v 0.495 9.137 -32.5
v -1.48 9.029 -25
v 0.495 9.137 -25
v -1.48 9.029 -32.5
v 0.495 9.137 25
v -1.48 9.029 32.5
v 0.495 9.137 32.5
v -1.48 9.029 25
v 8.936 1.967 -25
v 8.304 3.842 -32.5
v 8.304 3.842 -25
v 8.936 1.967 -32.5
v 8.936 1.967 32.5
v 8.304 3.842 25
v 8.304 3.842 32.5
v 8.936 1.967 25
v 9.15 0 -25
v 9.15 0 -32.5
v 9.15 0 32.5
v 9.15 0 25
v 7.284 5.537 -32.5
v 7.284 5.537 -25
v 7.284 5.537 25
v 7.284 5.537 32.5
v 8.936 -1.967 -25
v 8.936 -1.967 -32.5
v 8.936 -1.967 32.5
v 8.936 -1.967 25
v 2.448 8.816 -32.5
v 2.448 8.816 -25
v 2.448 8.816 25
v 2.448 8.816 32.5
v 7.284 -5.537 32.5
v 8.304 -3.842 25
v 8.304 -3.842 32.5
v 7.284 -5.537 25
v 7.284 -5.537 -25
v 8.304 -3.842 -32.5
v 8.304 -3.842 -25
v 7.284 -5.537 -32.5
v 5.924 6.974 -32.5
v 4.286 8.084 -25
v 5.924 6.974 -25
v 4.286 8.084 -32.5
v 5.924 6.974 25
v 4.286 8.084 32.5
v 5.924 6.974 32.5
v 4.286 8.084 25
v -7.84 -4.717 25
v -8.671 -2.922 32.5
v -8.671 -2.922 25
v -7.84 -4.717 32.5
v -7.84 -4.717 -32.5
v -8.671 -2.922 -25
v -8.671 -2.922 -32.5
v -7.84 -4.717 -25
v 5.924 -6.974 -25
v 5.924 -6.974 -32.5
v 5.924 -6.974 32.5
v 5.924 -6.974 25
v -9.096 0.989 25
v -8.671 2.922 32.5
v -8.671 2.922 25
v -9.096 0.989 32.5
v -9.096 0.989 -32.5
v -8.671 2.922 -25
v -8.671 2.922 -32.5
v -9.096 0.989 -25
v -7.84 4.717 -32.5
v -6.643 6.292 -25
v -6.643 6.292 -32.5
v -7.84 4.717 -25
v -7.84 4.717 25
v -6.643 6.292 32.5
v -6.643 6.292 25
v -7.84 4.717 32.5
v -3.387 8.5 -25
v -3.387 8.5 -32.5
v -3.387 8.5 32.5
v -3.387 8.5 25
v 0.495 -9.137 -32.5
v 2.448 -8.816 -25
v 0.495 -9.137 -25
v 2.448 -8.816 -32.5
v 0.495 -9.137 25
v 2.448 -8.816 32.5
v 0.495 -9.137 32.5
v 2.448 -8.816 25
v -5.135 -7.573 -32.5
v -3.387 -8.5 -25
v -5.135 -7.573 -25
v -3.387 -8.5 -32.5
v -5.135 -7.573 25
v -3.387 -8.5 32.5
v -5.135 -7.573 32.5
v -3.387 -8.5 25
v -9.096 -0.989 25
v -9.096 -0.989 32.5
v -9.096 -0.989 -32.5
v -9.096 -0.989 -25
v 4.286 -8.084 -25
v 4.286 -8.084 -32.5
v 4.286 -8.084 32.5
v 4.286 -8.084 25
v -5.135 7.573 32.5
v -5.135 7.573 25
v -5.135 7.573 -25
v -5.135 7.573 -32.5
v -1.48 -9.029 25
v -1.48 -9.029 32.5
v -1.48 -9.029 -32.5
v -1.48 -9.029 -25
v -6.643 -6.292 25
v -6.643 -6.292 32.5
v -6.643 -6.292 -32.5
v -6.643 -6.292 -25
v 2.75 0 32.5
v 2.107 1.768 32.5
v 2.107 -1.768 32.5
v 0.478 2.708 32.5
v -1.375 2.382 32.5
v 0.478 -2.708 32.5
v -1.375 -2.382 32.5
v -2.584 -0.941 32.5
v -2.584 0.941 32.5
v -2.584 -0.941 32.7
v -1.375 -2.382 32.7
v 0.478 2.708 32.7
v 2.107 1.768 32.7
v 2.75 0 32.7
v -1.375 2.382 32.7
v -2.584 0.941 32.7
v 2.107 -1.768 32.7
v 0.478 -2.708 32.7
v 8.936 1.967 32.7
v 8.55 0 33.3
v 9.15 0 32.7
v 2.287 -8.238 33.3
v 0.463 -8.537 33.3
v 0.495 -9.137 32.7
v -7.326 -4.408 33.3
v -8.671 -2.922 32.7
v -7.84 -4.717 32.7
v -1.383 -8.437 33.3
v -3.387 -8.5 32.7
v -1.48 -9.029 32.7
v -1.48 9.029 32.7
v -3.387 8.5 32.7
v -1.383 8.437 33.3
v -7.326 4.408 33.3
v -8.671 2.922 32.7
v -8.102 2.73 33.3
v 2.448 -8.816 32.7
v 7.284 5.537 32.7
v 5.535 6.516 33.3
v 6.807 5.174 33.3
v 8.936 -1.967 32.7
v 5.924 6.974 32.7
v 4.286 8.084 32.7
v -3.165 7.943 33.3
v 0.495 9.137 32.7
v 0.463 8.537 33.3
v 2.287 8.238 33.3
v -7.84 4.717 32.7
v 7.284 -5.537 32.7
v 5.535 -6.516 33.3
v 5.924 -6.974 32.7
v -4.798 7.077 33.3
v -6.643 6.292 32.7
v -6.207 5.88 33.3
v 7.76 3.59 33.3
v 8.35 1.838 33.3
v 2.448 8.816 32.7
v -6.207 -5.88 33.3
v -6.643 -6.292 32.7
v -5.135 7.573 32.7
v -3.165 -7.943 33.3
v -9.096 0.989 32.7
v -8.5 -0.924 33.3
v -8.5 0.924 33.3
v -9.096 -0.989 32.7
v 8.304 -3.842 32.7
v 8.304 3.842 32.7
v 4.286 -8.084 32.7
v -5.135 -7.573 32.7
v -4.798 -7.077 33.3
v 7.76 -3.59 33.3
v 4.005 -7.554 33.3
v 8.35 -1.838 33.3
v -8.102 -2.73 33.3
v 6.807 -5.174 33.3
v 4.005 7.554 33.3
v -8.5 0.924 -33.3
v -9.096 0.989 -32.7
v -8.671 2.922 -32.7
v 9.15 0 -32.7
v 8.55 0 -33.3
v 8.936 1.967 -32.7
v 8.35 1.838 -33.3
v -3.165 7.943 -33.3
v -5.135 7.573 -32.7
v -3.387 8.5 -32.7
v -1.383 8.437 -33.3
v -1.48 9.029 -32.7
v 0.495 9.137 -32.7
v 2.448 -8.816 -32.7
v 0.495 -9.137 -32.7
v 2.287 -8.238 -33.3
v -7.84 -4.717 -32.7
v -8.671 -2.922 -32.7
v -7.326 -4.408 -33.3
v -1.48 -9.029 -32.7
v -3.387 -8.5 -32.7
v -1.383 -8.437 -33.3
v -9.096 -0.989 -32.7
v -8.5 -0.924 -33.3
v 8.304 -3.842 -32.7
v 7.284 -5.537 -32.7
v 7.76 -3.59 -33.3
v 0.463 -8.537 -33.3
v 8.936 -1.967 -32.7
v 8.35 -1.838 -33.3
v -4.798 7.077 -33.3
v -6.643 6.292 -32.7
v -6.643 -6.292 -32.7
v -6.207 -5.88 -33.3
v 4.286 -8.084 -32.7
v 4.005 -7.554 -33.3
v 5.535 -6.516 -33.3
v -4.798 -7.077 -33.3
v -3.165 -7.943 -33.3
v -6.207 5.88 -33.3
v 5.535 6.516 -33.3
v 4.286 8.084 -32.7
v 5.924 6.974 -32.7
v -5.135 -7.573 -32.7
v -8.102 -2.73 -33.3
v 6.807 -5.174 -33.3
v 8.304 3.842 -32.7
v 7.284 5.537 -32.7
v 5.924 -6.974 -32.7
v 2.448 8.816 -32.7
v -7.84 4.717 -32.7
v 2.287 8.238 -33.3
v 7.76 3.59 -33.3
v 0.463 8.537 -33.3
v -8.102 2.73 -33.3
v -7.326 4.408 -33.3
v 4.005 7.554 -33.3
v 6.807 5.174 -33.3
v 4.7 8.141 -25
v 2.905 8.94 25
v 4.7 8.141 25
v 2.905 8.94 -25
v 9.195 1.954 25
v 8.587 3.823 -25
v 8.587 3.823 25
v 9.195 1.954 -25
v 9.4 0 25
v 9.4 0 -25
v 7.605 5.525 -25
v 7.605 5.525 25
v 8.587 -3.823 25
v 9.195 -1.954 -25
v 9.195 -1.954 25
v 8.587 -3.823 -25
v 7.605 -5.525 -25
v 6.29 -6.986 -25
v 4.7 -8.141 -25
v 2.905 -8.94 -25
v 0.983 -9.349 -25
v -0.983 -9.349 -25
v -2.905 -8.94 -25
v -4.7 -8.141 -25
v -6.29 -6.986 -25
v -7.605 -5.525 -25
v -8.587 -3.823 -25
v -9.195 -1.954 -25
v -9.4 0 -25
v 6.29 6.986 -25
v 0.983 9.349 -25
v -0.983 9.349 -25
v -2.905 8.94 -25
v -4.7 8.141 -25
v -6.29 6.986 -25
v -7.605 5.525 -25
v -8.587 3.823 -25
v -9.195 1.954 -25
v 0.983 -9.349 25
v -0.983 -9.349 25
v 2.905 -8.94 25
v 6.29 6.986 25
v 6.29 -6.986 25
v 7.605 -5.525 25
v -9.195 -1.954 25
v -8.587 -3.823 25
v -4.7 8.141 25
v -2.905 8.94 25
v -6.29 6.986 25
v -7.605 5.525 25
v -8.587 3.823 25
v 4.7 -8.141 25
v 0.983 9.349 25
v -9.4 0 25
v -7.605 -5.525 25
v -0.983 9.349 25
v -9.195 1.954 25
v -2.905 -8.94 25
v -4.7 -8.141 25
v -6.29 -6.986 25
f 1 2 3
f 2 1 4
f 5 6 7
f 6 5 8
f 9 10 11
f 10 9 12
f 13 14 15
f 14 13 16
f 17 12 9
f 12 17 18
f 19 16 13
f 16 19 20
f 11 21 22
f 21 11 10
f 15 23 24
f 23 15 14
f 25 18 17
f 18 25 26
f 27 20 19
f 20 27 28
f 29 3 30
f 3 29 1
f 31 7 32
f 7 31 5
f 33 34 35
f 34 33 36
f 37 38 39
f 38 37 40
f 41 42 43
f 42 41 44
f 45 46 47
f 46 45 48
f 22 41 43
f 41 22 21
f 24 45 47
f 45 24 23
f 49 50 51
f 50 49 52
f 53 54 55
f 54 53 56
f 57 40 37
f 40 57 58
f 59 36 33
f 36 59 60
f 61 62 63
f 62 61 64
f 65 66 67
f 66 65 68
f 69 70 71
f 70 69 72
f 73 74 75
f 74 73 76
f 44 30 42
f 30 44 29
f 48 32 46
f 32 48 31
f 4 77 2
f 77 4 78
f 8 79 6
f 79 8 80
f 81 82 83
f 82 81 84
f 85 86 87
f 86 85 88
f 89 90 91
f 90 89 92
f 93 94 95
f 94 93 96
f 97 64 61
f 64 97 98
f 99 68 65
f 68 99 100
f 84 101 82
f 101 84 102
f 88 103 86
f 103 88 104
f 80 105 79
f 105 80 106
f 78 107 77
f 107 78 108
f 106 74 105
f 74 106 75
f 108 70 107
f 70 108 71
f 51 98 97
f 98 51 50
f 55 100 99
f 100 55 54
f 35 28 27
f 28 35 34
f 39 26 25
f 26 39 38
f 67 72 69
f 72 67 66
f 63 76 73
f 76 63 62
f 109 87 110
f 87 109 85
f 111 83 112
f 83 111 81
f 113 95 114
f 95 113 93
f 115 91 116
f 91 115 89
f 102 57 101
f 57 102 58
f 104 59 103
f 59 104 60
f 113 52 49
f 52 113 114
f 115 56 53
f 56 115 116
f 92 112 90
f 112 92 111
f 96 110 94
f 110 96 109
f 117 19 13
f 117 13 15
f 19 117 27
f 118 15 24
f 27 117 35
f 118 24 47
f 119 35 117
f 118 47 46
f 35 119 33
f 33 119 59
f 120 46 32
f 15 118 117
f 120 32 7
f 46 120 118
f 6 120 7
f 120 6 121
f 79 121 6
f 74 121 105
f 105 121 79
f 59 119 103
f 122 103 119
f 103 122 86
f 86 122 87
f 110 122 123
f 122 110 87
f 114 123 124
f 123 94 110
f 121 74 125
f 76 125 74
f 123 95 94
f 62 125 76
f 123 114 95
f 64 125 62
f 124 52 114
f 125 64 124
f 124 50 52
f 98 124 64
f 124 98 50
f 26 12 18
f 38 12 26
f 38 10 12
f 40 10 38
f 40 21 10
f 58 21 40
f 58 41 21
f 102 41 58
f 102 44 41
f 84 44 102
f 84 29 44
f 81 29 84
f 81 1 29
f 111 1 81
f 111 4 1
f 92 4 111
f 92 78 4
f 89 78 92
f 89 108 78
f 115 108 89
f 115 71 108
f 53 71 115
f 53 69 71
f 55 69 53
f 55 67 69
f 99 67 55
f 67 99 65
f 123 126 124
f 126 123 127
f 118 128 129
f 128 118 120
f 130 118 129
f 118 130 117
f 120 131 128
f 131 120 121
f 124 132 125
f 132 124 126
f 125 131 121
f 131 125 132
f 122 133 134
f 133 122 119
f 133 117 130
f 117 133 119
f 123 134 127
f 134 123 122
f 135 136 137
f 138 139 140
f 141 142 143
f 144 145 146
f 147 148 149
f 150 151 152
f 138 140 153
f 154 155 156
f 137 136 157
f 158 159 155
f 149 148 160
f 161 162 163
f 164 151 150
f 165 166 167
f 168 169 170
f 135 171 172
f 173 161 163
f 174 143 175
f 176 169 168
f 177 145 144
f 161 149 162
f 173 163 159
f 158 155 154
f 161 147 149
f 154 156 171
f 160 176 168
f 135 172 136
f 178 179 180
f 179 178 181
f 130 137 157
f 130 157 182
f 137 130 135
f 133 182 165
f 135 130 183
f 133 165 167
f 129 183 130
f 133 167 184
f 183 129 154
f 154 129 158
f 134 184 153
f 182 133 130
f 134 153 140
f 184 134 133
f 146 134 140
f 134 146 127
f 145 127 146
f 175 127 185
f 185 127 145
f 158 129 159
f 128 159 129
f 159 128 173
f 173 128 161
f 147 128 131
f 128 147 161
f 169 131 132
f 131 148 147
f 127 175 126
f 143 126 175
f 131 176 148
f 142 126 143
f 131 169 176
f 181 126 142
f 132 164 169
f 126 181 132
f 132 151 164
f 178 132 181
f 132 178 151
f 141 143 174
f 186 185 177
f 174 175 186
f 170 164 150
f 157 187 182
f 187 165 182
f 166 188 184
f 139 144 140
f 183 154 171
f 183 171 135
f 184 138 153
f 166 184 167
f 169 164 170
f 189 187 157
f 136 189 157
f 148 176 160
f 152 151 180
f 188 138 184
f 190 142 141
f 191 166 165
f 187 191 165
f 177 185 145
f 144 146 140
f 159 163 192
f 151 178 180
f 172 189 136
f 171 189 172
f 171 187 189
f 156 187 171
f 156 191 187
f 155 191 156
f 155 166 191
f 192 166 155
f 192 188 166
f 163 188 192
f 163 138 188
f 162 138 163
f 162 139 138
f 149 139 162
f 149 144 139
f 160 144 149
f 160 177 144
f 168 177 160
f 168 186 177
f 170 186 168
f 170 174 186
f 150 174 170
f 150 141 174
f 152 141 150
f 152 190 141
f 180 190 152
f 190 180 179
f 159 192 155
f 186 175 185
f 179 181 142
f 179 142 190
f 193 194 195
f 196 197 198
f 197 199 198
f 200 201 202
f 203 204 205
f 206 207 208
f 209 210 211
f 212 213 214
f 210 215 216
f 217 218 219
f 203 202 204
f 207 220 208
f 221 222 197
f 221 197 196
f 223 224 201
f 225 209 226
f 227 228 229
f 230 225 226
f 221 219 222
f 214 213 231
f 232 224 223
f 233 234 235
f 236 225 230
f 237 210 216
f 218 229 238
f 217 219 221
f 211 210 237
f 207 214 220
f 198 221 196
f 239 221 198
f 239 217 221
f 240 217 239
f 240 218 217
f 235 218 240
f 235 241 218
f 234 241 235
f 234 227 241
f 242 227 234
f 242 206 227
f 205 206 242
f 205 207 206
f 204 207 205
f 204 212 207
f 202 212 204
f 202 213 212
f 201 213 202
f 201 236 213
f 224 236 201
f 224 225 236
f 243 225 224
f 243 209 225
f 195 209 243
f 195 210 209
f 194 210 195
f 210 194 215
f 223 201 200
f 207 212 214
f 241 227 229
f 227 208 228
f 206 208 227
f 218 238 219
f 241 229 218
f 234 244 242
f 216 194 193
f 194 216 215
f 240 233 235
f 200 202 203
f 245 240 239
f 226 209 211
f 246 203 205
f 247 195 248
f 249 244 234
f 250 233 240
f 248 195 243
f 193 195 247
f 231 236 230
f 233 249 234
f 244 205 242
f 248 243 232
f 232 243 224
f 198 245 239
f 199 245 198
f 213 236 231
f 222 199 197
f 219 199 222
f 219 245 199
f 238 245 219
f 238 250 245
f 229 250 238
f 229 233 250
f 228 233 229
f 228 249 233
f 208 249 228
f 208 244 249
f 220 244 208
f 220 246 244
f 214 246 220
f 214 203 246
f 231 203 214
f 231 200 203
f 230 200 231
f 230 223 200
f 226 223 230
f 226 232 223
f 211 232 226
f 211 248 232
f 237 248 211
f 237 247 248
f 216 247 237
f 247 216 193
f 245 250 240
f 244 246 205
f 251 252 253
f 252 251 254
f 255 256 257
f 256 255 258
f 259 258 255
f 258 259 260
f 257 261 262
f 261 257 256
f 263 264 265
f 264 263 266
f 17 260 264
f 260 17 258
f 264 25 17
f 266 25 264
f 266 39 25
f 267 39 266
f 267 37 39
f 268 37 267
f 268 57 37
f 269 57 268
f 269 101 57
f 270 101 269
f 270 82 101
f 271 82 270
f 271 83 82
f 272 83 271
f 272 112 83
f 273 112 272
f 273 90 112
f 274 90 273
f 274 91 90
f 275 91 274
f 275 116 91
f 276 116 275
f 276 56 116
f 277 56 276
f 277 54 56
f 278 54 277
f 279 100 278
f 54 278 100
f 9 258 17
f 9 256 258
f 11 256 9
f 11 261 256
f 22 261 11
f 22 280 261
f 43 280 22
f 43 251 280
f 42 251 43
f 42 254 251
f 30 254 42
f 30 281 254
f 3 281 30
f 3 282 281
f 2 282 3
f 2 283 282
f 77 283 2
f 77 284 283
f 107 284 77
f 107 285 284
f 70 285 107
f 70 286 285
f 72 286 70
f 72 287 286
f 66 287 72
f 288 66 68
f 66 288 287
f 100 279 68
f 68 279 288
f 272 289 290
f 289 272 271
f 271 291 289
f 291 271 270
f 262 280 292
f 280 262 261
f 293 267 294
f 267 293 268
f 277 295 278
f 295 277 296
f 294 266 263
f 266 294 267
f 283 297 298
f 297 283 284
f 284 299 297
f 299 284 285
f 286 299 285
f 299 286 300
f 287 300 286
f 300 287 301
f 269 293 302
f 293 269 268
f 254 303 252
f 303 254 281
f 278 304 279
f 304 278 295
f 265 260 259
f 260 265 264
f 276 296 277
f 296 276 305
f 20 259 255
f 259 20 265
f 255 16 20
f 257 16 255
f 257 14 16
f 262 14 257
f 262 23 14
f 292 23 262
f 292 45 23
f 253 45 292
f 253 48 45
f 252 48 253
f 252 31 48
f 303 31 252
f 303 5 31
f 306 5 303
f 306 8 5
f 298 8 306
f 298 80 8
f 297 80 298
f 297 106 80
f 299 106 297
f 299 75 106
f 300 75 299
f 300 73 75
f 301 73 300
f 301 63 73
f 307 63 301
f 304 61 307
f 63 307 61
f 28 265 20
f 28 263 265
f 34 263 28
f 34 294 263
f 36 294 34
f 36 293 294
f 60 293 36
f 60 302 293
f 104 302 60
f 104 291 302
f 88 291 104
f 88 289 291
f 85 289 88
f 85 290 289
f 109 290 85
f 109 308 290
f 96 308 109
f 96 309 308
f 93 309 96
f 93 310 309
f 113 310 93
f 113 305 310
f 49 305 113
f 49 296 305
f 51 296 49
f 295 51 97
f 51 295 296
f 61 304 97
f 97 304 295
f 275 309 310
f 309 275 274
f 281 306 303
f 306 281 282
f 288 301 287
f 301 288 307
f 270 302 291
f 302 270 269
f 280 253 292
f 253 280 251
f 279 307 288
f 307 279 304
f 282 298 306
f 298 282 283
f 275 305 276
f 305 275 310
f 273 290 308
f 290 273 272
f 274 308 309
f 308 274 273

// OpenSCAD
// Parameters
cell_H = 65.0; //[32.5:130.0:0.1]
cell_D = 18.3; //[9.15:36.6:0.1]
cap_H = 1.2; //[0.6:2.4:0.05]
cap_D = 5.5; //[2.75:11.0:0.1]
insulator_H = 0.6; //[0.3:1.2:0.05]
insulator_radial_thk = 1.0; //[0.5:2.0:0.05]
neg_face_H = 0.4; //[0.2:1.0:0.05]
wrap_H = 50.0; //[25.0:100.0:0.5]
wrap_radial_thk = 0.25; //[0.1:0.6:0.05]
wrap_z_offset = 0.0; //[-10.0:10.0:0.5]
edge_chamfer_H = 0.6; //[0.2:1.5:0.05]
edge_chamfer_radial = 0.6; //[0.2:1.5:0.05]
overlap = 0.8; //[0.2:2.0:0.1]

// Base Shapes
module cell_cylindrical_body() {
  color("Silver")
  cylinder(h=cell_H, r=cell_D/2, center=true);
}

module top_positive_cap() {
  color("DimGray")
  translate([0, 0, cell_H/2 + cap_H/2 - overlap])
  cylinder(h=cap_H, r=cap_D/2, center=true);
}

module bottom_negative_face() {
  color("DimGray")
  translate([0, 0, -cell_H/2 - neg_face_H/2 + overlap])
  cylinder(h=neg_face_H, r=cell_D/2, center=true);
}

module top_insulator_outer() {
  cylinder(h=insulator_H, r=cell_D/2, center=true);
}

module top_insulator_inner_cut() {
  cylinder(h=insulator_H + 2*overlap, r=cell_D/2 - insulator_radial_thk, center=true);
}

module top_insulator_ring() {
  color("Black")
  translate([0, 0, cell_H/2 + insulator_H/2 - overlap])
  difference() {
    top_insulator_outer();
    top_insulator_inner_cut();
  }
}

module edge_chamfer_top() {
  color("Silver")
  translate([0, 0, cell_H/2 - edge_chamfer_H/2 + overlap])
  cylinder(h=edge_chamfer_H, r1=cell_D/2, r2=cell_D/2 - edge_chamfer_radial, center=true);
}

module edge_chamfer_bottom() {
  color("Silver")
  translate([0, 0, -cell_H/2 + edge_chamfer_H/2 - overlap])
  cylinder(h=edge_chamfer_H, r1=cell_D/2 - edge_chamfer_radial, r2=cell_D/2, center=true);
}

module surface_label_wrap() {
  color("Blue")
  translate([0, 0, wrap_z_offset])
  cylinder(h=wrap_H, r=cell_D/2 + wrap_radial_thk, center=true);
}

// Final Assembly
module battery_cell_complete() {
  union() {
    cell_cylindrical_body();
    top_positive_cap();
    bottom_negative_face();
    top_insulator_ring();
    edge_chamfer_top();
    edge_chamfer_bottom();
    surface_label_wrap();
  }
}

// Render the complete battery cell
battery_cell_complete();
